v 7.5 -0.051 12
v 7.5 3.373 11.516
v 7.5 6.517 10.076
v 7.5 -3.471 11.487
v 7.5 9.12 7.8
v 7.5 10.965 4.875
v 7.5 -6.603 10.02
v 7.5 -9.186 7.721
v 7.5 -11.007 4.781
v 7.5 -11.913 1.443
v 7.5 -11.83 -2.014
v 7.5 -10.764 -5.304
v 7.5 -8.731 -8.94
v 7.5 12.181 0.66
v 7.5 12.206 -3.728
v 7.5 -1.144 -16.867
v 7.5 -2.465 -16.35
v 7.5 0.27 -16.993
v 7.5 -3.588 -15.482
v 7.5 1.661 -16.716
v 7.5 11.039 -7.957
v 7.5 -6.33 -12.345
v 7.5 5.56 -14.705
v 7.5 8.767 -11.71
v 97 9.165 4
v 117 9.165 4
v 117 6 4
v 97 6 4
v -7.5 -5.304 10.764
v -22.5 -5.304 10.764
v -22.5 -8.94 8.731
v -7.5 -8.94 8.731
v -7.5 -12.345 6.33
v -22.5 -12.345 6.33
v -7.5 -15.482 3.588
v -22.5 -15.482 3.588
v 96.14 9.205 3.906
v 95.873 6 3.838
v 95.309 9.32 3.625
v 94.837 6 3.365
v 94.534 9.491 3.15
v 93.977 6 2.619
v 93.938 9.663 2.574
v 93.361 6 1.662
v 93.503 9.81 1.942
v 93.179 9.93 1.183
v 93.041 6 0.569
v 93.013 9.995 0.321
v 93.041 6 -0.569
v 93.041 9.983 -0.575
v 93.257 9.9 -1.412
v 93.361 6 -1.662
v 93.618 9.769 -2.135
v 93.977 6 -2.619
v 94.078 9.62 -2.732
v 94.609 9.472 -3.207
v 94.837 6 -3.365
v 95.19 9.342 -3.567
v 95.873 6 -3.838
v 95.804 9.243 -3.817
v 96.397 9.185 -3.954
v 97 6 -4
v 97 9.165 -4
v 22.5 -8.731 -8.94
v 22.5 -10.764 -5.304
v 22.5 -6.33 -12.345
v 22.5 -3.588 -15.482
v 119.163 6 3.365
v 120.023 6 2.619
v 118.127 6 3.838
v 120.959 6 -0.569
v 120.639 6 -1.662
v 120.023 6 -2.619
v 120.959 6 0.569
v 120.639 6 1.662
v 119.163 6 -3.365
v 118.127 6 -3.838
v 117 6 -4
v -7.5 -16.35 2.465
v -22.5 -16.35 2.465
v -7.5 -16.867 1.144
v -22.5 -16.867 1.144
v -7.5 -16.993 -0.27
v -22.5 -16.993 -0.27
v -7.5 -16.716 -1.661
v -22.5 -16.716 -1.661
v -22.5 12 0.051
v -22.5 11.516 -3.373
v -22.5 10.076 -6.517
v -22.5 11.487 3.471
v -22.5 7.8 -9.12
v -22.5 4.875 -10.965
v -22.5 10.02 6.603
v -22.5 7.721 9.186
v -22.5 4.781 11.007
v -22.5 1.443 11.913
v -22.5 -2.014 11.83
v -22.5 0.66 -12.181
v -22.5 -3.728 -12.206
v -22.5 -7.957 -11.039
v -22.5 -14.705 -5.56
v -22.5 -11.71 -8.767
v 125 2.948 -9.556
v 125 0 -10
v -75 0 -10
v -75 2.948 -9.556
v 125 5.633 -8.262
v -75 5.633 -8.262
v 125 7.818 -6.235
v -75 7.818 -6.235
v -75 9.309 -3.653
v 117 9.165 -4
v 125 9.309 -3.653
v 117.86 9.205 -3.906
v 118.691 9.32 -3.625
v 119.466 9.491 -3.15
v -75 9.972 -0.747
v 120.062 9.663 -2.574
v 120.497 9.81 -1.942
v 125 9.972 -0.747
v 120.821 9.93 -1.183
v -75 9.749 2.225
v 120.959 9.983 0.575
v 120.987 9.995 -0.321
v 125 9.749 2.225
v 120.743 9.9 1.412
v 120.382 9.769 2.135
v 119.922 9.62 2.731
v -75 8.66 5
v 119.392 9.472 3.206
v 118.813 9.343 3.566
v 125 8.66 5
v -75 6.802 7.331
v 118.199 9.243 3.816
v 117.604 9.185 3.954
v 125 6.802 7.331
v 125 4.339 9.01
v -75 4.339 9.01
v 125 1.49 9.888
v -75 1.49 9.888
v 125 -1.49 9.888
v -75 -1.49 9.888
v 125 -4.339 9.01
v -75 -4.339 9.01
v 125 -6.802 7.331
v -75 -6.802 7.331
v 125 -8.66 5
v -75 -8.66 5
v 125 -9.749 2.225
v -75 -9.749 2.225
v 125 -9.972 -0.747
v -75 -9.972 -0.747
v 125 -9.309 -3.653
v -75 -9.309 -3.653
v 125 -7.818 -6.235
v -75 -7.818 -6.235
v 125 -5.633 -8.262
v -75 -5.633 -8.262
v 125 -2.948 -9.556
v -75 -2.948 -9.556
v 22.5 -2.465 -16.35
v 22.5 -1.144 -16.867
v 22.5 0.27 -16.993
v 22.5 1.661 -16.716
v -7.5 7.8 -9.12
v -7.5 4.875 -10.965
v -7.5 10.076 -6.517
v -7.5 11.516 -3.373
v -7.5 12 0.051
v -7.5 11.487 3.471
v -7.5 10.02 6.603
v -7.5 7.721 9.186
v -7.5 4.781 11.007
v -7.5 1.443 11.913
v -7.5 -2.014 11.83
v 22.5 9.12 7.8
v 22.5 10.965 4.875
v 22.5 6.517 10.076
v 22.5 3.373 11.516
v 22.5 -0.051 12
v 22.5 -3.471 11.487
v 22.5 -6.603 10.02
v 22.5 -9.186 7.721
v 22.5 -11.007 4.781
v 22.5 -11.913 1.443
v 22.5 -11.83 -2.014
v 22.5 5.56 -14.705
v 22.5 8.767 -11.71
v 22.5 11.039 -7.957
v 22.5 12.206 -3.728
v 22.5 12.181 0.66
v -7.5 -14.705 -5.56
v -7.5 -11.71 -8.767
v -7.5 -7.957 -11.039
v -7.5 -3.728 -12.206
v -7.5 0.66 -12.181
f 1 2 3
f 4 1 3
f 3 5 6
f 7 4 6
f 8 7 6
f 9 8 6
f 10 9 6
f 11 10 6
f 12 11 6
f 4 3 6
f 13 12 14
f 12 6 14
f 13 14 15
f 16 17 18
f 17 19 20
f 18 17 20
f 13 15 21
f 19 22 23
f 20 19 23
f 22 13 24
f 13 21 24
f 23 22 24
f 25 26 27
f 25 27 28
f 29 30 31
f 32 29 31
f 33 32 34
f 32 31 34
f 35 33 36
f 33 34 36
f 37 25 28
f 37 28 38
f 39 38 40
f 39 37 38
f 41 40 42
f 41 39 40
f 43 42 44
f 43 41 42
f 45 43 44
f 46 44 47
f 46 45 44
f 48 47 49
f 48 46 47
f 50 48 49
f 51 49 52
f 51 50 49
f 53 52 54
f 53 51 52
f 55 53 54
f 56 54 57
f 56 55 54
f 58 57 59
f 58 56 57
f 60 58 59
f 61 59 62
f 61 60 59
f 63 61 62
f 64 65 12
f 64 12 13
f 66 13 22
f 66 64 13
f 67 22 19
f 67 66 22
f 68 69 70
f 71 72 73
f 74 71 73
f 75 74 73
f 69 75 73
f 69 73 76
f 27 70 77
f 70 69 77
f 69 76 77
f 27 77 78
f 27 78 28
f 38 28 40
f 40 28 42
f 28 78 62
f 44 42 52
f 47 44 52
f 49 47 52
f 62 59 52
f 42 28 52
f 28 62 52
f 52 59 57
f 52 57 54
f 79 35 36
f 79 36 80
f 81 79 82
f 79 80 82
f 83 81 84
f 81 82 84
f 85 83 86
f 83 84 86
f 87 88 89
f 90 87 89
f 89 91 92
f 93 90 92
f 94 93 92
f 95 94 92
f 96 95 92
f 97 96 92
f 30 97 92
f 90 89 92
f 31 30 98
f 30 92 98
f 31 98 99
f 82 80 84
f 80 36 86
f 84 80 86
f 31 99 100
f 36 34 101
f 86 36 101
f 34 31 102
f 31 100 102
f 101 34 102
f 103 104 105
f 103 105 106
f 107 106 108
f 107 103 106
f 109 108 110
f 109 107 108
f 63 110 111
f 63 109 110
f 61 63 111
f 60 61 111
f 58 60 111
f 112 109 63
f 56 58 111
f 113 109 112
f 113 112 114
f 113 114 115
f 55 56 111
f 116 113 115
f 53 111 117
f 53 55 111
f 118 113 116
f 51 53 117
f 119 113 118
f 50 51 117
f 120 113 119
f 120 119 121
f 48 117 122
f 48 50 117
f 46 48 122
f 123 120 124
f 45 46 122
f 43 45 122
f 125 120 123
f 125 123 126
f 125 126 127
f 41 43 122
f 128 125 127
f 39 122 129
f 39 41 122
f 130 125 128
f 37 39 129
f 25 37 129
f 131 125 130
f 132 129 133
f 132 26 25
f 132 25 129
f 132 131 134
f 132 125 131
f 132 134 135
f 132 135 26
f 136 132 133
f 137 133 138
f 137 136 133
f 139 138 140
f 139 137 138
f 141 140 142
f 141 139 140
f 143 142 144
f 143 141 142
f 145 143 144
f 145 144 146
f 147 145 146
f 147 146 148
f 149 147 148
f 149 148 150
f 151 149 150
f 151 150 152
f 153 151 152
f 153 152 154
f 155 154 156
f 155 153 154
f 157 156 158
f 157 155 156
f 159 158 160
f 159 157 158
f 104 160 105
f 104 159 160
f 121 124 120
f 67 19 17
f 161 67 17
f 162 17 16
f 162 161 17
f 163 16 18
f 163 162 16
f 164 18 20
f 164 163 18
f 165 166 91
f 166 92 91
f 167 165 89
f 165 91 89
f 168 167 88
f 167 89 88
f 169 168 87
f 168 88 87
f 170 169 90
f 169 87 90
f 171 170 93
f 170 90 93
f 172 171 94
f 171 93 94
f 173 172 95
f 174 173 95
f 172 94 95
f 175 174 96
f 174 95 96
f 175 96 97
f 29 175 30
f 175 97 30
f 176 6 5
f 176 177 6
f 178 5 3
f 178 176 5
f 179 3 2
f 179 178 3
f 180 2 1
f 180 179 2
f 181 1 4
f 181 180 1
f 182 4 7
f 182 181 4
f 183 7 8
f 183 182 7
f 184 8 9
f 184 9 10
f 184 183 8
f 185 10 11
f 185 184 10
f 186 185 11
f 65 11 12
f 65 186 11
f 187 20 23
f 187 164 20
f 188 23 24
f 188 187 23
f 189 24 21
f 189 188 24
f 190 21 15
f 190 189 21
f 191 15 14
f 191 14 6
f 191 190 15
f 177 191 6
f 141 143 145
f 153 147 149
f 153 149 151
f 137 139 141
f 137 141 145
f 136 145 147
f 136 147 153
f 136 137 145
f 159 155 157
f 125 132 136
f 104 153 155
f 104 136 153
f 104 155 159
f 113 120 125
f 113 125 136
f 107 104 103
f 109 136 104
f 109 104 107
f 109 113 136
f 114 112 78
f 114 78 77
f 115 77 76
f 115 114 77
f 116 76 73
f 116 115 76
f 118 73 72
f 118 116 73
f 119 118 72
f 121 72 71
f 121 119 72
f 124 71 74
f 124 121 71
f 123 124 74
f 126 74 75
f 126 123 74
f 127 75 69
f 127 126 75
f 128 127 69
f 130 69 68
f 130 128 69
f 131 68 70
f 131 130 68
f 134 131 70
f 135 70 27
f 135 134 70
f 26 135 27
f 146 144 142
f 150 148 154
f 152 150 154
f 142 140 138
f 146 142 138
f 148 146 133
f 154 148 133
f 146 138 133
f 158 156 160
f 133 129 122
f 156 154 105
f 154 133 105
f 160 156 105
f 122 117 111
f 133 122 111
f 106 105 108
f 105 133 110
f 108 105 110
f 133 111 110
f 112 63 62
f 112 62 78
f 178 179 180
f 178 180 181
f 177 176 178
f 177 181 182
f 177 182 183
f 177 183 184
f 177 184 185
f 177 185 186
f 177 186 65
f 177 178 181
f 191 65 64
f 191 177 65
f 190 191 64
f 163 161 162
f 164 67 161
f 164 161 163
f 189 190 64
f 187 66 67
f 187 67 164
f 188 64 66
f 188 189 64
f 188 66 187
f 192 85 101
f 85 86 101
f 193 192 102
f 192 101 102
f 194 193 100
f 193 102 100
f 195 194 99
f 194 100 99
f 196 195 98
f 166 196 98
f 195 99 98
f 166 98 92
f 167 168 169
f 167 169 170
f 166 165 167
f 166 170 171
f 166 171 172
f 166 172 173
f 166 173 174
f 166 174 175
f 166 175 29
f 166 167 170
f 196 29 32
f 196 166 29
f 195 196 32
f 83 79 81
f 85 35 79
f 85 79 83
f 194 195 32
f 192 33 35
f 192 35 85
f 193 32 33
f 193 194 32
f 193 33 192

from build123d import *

# Parameters (mm, degrees)
SKETCH1_R                = 10
BOSS_EXTRUDE1_DEPTH      = 125
BOSS_EXTRUDE1_DEPTH_BACK = 75
BOSS_EXTRUDE2_START      = 15
BOSS_EXTRUDE2_DEPTH      = 7.5
BODY_MOVE_COPY2_ANGLE    = 90
CUT_EXTRUDE1_DEPTH       = 4


with BuildPart() as part:
    # Sketch1 → Boss-Extrude1 (new body, two sides)
    with BuildSketch(Plane(origin=(0, 0, 0), x_dir=(0, 0, -1), z_dir=(1, 0, 0))) as boss_extrude1_sk:
        Circle(SKETCH1_R)
    extrude(amount=BOSS_EXTRUDE1_DEPTH)
    extrude(boss_extrude1_sk.sketch, amount=-BOSS_EXTRUDE1_DEPTH_BACK)

    # Sketch3 → Cut-Extrude1 (cut)
    with BuildSketch(Plane(origin=(0, 10, 0), x_dir=(1, 0, 0), z_dir=(0, 1, 0))):
        with BuildLine():
            Line((117, -4), (97, -4))
            ThreePointArc((97, -4), (93, 0), (97, 4))
            Line((97, 4), (117, 4))
            ThreePointArc((117, 4), (121, 0), (117, -4))
        make_face()
    extrude(amount=-CUT_EXTRUDE1_DEPTH, mode=Mode.SUBTRACT)


with BuildPart() as body_2:
    # Sketch2 → Boss-Extrude2 (new body, symmetric)
    with BuildSketch(Plane(origin=(0, 0, 0), x_dir=(0, 0, -1), z_dir=(1, 0, 0)).offset(BOSS_EXTRUDE2_START)):
        with BuildLine():
            ThreePointArc((-4.875, 10.965143638), (-10.866880674, -5.090275475), (5.303571429, -10.764391766))
            ThreePointArc((5.303571429, -10.764391766), (10.673861143, -7.574827955), (15.482142857, -3.588130589))
            ThreePointArc((15.482142857, -3.588130589), (16.867377987, -1.143954342), (16.715909091, 1.6613854))
            ThreePointArc((16.715909091, 1.6613854), (7.956738236, 11.038797462), (-4.875, 10.965143638))
        make_face()
    extrude(amount=BOSS_EXTRUDE2_DEPTH, both=True)


with BuildPart() as body_3:
    # Mirror3: mirrored copy
    add(body_2.part.mirror(Plane(origin=(0, 0, 0), x_dir=(0, 0, 1), z_dir=(1, 0, 0))))


with BuildPart() as body_3_1:
    # Body-Move/Copy2: moved
    add(body_3.part.rotate(Axis((0, 0, 0), (-1, 0, 0)), BODY_MOVE_COPY2_ANGLE))


solid = Compound([part.part, body_2.part, body_3_1.part])
